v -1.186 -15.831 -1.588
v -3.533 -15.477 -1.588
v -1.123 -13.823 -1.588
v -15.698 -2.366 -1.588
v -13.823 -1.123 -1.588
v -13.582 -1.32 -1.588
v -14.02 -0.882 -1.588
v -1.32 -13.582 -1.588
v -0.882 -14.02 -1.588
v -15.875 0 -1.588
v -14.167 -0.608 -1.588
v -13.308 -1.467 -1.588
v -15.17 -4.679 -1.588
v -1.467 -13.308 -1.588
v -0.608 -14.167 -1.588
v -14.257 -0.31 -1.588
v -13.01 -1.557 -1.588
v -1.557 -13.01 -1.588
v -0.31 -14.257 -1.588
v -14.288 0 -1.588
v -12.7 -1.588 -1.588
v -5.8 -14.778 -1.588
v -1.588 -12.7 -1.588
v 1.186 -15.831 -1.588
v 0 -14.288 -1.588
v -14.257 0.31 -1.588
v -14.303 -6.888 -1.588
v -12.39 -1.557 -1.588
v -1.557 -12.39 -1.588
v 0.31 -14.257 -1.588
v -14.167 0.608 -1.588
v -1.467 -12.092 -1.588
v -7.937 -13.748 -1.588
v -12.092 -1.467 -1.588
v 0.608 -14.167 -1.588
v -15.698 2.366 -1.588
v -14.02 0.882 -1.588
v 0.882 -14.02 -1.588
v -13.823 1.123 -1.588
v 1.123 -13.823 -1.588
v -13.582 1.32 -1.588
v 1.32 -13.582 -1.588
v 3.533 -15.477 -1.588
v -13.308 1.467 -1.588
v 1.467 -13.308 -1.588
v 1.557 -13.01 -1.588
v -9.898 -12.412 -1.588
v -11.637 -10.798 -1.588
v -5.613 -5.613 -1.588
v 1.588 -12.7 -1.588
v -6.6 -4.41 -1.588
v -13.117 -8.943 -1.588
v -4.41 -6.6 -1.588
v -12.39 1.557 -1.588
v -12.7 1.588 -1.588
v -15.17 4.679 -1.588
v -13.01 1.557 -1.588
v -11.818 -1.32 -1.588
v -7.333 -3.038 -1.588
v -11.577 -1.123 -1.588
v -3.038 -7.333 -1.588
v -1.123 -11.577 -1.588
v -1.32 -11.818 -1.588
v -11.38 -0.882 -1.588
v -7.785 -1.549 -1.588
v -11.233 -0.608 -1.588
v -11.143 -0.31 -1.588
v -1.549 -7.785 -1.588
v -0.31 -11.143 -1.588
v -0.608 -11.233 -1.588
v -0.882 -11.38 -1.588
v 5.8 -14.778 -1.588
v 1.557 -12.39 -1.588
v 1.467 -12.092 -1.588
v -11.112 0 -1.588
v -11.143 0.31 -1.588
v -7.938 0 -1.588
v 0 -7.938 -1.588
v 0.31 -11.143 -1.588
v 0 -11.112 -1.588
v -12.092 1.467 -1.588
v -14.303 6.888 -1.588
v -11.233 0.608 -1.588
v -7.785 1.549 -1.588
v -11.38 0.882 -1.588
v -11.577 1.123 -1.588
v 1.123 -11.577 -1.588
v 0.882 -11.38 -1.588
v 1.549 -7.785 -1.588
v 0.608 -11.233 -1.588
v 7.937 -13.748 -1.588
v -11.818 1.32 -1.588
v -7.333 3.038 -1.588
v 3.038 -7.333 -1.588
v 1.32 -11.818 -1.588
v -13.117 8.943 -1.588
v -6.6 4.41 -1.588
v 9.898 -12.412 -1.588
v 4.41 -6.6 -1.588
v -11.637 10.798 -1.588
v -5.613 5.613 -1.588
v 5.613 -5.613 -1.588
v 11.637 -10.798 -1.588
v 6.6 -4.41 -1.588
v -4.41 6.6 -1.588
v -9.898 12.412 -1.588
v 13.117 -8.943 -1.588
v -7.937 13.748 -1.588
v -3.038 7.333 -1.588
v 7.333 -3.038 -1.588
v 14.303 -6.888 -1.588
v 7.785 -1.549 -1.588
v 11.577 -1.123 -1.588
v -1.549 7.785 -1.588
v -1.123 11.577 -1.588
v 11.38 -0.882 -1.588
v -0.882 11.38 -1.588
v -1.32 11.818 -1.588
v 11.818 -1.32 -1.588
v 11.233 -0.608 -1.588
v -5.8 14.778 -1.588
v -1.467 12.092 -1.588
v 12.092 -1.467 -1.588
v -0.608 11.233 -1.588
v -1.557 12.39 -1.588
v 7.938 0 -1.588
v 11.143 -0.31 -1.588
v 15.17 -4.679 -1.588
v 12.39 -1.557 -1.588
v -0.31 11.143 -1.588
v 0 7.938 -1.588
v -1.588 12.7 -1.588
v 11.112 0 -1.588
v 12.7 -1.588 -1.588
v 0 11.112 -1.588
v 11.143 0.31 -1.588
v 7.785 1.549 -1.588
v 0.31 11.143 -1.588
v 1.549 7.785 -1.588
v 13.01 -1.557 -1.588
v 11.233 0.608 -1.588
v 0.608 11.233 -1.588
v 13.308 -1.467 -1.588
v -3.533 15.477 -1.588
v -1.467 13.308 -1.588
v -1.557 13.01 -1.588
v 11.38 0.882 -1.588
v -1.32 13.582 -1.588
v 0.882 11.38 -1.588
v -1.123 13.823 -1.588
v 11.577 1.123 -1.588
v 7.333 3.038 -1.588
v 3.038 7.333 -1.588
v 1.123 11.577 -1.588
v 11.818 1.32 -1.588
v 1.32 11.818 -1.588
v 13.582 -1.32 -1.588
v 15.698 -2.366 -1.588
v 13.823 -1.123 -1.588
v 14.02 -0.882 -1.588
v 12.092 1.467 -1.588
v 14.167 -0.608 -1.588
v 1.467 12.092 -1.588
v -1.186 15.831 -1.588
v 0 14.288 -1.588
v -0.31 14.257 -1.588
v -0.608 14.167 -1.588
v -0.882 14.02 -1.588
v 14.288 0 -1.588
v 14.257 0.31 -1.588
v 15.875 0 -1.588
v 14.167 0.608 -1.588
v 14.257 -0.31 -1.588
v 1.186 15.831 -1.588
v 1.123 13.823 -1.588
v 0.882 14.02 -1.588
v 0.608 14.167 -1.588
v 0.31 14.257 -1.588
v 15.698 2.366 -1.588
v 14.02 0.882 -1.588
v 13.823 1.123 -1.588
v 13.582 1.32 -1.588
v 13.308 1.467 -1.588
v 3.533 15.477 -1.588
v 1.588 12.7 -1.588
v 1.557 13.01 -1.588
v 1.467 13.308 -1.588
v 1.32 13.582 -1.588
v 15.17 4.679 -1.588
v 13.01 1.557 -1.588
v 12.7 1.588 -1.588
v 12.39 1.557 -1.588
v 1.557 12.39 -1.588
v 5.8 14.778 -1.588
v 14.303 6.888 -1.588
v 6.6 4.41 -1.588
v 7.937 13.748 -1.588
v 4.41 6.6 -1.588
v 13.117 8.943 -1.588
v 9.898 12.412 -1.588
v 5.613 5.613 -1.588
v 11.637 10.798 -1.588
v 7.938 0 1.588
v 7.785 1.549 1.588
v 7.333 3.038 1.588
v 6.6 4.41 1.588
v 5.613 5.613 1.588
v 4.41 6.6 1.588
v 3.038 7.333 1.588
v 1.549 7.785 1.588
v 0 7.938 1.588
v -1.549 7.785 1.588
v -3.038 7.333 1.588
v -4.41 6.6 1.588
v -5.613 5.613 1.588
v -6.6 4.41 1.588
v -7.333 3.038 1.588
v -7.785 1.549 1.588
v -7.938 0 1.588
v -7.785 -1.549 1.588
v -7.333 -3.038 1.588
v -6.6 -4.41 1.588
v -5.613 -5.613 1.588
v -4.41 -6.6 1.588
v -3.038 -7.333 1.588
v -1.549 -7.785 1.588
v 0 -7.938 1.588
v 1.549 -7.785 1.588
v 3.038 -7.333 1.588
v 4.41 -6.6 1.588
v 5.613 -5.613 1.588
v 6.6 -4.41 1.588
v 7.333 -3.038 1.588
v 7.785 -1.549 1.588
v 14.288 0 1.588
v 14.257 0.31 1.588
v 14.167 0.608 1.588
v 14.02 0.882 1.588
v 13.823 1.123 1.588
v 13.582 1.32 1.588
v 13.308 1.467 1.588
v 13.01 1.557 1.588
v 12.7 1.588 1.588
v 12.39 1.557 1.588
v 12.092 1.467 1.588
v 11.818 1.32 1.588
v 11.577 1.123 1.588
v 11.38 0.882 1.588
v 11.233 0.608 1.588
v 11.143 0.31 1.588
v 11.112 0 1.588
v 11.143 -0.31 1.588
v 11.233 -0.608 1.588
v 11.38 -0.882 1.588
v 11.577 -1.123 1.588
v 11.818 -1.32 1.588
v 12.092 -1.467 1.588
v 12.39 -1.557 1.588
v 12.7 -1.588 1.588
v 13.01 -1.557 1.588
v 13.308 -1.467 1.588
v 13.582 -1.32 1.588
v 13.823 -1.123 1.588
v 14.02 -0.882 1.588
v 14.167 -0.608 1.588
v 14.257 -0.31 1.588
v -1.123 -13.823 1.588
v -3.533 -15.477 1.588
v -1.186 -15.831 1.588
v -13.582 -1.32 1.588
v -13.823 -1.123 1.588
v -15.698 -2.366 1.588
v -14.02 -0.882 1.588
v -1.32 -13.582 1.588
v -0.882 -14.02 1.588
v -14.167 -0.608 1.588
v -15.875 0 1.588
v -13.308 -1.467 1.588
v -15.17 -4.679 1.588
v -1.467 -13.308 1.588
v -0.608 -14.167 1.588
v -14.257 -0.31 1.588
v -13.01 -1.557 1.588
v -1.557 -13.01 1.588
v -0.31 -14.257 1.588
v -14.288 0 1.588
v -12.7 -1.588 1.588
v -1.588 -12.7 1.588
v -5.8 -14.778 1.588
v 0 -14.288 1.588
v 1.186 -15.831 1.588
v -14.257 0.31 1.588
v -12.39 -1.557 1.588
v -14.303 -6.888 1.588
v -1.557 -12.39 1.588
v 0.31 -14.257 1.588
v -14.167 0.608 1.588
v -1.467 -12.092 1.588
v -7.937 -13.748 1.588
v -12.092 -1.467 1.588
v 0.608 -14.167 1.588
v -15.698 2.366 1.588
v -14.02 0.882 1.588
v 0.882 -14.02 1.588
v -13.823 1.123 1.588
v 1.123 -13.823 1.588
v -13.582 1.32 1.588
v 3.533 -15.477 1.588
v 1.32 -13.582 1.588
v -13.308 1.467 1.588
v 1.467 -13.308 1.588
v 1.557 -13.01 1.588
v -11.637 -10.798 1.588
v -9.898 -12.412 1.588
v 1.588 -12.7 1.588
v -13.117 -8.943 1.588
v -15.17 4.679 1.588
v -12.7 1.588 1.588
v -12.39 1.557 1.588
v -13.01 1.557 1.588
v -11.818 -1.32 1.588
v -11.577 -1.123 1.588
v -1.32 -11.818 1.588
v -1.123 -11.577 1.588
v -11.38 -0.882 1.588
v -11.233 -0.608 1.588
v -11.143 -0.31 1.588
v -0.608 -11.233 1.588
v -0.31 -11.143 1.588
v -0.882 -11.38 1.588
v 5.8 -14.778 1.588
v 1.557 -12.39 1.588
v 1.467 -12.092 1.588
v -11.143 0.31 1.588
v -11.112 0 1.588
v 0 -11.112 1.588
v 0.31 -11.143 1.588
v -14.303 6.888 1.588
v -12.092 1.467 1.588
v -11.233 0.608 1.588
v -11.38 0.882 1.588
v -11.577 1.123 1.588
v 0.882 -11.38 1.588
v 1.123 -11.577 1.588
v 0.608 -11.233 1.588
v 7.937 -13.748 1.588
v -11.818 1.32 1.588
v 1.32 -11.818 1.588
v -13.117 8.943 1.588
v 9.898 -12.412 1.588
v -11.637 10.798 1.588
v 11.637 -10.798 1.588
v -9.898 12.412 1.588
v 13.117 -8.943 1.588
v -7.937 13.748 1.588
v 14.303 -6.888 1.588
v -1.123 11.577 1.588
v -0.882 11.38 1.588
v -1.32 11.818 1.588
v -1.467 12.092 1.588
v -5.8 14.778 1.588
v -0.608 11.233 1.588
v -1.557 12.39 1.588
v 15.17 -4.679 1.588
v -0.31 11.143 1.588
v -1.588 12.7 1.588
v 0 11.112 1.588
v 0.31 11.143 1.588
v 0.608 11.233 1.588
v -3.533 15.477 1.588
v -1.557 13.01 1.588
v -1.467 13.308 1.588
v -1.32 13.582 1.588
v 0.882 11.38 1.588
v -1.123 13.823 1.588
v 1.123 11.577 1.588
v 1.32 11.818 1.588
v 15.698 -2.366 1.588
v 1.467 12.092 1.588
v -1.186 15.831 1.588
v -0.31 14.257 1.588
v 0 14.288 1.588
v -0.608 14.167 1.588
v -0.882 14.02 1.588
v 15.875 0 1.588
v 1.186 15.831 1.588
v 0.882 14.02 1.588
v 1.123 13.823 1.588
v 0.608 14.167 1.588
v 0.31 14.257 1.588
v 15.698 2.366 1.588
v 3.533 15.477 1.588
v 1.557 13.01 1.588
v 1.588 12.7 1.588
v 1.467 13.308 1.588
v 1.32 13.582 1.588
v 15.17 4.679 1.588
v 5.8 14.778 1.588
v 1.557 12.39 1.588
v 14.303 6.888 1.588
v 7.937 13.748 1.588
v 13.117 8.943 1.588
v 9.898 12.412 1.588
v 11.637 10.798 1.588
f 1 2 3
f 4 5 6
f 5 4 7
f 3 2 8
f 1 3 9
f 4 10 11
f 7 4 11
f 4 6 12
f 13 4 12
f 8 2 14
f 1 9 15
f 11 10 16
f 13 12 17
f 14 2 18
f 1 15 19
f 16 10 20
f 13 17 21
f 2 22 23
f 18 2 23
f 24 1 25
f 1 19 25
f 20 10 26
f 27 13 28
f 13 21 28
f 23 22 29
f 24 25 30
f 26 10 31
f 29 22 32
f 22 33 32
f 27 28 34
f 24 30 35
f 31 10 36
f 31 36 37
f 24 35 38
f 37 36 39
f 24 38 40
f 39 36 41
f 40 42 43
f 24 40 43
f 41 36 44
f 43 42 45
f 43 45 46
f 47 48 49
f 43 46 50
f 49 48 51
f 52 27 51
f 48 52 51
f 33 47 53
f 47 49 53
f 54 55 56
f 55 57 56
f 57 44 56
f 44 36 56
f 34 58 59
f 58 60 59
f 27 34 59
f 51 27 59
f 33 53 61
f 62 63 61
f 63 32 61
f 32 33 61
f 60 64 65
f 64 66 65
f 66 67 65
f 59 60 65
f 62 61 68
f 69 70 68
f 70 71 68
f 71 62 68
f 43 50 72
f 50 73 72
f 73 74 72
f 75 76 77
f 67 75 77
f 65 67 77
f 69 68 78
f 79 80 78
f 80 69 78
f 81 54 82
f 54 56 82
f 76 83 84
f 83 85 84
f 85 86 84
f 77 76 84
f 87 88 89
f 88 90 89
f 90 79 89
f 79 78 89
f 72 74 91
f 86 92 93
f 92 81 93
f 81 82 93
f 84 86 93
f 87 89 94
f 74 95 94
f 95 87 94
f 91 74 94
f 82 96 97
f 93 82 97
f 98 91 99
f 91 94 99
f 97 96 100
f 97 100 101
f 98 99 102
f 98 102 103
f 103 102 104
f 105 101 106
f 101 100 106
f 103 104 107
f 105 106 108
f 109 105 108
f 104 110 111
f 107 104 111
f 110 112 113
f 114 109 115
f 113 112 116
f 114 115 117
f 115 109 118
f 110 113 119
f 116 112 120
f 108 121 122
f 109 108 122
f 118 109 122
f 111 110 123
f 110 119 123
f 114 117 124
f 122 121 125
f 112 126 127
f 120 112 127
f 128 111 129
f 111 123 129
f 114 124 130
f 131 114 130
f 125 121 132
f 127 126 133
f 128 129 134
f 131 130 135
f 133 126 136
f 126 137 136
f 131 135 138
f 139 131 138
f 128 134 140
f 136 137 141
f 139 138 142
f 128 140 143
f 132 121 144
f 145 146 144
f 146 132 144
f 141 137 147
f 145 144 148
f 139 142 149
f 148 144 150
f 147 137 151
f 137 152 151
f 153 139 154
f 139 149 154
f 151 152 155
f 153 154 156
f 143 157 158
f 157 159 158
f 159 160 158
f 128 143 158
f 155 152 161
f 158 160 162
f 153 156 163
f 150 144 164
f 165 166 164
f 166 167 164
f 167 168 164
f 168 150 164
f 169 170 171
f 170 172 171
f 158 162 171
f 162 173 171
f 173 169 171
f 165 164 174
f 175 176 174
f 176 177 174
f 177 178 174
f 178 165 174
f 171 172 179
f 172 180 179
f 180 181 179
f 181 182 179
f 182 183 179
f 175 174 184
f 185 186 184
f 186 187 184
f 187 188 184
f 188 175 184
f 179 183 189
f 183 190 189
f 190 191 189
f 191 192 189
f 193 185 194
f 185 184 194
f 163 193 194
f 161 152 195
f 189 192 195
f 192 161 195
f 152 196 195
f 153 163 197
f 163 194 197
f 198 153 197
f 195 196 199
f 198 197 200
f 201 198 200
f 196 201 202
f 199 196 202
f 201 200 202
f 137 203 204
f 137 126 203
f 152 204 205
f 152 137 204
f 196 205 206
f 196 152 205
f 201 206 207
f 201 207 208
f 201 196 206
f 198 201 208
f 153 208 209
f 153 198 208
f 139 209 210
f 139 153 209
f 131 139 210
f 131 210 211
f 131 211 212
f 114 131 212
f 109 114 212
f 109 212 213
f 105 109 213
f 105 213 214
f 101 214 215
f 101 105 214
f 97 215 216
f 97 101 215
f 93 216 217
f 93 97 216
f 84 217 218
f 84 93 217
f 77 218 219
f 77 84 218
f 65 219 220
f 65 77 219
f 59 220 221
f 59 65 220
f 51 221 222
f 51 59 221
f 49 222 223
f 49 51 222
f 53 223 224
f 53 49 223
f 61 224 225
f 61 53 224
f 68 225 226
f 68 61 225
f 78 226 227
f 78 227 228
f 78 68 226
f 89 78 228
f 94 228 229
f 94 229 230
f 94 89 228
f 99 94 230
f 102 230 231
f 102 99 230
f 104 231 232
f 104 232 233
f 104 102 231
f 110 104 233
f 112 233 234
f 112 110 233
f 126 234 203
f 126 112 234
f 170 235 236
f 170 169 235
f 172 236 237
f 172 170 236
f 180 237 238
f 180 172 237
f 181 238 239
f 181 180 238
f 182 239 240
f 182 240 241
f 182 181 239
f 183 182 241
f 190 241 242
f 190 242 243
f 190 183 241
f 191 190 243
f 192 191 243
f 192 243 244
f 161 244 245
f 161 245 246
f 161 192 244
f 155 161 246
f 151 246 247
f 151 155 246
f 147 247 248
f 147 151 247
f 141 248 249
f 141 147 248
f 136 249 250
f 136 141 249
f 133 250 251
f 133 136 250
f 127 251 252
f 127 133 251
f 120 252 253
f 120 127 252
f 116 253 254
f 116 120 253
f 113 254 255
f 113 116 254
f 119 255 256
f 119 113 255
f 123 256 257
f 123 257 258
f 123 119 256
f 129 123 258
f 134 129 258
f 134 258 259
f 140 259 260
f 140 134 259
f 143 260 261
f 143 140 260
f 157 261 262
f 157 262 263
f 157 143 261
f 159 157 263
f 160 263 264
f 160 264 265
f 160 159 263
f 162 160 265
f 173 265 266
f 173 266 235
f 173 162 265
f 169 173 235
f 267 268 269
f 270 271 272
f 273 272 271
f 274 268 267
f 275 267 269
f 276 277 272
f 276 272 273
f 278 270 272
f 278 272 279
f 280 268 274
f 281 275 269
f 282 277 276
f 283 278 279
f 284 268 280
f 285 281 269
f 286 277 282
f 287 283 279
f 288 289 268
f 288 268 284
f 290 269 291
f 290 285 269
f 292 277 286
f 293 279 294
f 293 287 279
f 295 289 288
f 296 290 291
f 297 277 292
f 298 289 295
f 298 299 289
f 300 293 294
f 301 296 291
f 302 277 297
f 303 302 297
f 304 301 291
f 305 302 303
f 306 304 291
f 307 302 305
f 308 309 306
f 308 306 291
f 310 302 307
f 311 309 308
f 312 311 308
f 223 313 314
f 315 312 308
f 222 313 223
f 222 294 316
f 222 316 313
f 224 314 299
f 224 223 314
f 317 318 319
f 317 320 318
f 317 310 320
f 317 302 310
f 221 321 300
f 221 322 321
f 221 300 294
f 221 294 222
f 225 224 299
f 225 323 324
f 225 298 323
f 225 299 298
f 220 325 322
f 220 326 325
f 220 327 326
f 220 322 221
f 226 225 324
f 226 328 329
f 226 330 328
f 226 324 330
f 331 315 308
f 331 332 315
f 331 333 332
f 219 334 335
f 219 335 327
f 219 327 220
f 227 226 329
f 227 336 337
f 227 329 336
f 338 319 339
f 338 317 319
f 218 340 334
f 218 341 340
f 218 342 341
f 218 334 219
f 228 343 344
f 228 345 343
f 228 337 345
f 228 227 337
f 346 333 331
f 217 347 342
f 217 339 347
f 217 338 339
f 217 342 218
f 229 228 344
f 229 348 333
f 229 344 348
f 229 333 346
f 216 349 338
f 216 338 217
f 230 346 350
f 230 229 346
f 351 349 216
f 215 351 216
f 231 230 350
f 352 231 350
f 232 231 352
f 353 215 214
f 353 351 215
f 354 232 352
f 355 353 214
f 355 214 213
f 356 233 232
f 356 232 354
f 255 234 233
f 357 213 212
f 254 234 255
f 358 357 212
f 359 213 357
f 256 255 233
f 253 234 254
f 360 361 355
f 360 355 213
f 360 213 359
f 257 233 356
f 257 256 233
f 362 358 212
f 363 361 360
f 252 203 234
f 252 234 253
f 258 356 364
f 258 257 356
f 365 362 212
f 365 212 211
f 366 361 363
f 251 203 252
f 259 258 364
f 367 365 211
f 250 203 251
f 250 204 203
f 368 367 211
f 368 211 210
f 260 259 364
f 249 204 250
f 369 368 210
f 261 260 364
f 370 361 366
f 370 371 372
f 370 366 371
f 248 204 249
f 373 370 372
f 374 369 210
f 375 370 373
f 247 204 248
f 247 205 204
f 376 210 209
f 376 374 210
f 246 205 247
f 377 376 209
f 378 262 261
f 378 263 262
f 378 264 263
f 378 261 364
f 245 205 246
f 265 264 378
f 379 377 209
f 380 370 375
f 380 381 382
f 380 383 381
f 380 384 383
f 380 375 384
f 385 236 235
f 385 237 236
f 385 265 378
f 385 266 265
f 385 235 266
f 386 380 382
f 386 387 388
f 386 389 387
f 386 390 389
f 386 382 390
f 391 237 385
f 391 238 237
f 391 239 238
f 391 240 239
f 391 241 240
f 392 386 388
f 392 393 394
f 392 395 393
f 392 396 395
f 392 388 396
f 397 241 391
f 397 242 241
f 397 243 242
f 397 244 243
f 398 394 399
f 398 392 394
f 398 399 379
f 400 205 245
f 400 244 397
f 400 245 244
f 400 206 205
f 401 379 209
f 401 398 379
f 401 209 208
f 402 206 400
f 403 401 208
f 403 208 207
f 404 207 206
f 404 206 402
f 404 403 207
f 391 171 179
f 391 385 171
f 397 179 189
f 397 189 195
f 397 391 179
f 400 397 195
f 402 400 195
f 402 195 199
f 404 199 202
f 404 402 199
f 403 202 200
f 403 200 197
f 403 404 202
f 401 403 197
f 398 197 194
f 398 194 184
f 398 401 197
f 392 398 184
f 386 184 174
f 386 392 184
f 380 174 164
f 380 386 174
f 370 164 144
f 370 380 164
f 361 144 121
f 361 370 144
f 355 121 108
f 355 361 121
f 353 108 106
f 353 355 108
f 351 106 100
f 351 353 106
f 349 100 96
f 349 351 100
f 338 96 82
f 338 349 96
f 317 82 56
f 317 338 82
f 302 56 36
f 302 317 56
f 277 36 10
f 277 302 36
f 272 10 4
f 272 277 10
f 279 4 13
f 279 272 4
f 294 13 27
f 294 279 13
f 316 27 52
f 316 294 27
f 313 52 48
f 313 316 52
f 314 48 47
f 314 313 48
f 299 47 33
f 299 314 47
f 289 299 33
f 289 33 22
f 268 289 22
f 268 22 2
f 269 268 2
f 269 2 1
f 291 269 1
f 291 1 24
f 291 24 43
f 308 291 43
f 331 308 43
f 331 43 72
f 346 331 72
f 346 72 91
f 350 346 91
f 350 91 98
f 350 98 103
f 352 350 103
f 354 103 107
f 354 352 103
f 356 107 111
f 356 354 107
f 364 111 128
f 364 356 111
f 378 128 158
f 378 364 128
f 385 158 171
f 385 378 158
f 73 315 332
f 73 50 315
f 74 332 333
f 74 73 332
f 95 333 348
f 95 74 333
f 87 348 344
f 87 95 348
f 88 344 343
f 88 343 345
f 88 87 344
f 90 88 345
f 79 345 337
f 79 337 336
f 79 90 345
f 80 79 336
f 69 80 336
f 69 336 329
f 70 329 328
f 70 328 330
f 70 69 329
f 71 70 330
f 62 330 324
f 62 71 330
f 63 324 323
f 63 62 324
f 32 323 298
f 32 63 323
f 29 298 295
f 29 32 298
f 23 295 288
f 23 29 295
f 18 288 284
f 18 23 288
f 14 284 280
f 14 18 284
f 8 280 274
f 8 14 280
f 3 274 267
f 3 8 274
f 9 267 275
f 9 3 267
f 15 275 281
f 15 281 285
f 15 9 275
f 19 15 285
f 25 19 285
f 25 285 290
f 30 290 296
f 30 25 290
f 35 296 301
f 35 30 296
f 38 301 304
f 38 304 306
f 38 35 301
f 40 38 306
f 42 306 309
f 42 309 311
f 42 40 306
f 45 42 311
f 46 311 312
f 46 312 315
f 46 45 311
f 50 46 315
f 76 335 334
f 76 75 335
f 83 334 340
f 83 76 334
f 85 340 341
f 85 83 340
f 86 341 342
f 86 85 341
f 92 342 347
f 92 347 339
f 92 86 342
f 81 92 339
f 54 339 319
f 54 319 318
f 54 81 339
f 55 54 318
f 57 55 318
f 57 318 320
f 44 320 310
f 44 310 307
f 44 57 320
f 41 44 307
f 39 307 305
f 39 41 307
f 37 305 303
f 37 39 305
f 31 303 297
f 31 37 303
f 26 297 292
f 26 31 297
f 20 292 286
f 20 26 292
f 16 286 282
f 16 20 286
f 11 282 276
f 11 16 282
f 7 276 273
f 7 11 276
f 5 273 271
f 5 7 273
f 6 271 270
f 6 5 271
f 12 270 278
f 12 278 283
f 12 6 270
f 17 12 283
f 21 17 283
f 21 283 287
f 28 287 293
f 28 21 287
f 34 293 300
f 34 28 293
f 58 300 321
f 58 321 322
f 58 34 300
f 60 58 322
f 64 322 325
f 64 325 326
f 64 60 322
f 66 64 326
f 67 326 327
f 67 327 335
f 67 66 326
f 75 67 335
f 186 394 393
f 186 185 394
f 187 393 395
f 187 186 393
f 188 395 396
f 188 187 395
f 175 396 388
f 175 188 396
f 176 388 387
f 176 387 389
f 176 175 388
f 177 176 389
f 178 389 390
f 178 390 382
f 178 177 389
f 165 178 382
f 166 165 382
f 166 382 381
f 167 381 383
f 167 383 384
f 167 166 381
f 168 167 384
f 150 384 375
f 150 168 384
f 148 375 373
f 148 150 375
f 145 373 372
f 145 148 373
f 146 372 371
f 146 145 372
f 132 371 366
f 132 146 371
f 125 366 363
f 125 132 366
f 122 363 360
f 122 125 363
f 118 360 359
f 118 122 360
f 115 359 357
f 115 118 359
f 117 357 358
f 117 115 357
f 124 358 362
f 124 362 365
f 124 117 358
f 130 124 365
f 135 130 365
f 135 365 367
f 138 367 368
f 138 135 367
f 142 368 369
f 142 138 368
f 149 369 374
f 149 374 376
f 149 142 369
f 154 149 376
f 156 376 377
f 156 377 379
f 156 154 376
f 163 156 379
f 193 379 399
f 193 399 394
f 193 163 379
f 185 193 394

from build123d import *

# Parameters (mm, degrees)
F0_R     = 15.875
F0_R_2   = 1.5875
F0_R_3   = 7.9375
F1_DEPTH = 1.5875


with BuildPart() as f1:
    # F0 (on Top) → F1 (new body, symmetric)
    with BuildSketch(Plane.XY):
        Circle(F0_R)
        with Locations((0, -12.7)):
            Circle(F0_R_2, mode=Mode.SUBTRACT)
        with Locations((-12.7, 0)):
            Circle(F0_R_2, mode=Mode.SUBTRACT)
        Circle(F0_R_3, mode=Mode.SUBTRACT)
        with Locations((12.7, 0)):
            Circle(F0_R_2, mode=Mode.SUBTRACT)
        with Locations((0, 12.7)):
            Circle(F0_R_2, mode=Mode.SUBTRACT)
    extrude(amount=F1_DEPTH, both=True)


solid = f1.part
